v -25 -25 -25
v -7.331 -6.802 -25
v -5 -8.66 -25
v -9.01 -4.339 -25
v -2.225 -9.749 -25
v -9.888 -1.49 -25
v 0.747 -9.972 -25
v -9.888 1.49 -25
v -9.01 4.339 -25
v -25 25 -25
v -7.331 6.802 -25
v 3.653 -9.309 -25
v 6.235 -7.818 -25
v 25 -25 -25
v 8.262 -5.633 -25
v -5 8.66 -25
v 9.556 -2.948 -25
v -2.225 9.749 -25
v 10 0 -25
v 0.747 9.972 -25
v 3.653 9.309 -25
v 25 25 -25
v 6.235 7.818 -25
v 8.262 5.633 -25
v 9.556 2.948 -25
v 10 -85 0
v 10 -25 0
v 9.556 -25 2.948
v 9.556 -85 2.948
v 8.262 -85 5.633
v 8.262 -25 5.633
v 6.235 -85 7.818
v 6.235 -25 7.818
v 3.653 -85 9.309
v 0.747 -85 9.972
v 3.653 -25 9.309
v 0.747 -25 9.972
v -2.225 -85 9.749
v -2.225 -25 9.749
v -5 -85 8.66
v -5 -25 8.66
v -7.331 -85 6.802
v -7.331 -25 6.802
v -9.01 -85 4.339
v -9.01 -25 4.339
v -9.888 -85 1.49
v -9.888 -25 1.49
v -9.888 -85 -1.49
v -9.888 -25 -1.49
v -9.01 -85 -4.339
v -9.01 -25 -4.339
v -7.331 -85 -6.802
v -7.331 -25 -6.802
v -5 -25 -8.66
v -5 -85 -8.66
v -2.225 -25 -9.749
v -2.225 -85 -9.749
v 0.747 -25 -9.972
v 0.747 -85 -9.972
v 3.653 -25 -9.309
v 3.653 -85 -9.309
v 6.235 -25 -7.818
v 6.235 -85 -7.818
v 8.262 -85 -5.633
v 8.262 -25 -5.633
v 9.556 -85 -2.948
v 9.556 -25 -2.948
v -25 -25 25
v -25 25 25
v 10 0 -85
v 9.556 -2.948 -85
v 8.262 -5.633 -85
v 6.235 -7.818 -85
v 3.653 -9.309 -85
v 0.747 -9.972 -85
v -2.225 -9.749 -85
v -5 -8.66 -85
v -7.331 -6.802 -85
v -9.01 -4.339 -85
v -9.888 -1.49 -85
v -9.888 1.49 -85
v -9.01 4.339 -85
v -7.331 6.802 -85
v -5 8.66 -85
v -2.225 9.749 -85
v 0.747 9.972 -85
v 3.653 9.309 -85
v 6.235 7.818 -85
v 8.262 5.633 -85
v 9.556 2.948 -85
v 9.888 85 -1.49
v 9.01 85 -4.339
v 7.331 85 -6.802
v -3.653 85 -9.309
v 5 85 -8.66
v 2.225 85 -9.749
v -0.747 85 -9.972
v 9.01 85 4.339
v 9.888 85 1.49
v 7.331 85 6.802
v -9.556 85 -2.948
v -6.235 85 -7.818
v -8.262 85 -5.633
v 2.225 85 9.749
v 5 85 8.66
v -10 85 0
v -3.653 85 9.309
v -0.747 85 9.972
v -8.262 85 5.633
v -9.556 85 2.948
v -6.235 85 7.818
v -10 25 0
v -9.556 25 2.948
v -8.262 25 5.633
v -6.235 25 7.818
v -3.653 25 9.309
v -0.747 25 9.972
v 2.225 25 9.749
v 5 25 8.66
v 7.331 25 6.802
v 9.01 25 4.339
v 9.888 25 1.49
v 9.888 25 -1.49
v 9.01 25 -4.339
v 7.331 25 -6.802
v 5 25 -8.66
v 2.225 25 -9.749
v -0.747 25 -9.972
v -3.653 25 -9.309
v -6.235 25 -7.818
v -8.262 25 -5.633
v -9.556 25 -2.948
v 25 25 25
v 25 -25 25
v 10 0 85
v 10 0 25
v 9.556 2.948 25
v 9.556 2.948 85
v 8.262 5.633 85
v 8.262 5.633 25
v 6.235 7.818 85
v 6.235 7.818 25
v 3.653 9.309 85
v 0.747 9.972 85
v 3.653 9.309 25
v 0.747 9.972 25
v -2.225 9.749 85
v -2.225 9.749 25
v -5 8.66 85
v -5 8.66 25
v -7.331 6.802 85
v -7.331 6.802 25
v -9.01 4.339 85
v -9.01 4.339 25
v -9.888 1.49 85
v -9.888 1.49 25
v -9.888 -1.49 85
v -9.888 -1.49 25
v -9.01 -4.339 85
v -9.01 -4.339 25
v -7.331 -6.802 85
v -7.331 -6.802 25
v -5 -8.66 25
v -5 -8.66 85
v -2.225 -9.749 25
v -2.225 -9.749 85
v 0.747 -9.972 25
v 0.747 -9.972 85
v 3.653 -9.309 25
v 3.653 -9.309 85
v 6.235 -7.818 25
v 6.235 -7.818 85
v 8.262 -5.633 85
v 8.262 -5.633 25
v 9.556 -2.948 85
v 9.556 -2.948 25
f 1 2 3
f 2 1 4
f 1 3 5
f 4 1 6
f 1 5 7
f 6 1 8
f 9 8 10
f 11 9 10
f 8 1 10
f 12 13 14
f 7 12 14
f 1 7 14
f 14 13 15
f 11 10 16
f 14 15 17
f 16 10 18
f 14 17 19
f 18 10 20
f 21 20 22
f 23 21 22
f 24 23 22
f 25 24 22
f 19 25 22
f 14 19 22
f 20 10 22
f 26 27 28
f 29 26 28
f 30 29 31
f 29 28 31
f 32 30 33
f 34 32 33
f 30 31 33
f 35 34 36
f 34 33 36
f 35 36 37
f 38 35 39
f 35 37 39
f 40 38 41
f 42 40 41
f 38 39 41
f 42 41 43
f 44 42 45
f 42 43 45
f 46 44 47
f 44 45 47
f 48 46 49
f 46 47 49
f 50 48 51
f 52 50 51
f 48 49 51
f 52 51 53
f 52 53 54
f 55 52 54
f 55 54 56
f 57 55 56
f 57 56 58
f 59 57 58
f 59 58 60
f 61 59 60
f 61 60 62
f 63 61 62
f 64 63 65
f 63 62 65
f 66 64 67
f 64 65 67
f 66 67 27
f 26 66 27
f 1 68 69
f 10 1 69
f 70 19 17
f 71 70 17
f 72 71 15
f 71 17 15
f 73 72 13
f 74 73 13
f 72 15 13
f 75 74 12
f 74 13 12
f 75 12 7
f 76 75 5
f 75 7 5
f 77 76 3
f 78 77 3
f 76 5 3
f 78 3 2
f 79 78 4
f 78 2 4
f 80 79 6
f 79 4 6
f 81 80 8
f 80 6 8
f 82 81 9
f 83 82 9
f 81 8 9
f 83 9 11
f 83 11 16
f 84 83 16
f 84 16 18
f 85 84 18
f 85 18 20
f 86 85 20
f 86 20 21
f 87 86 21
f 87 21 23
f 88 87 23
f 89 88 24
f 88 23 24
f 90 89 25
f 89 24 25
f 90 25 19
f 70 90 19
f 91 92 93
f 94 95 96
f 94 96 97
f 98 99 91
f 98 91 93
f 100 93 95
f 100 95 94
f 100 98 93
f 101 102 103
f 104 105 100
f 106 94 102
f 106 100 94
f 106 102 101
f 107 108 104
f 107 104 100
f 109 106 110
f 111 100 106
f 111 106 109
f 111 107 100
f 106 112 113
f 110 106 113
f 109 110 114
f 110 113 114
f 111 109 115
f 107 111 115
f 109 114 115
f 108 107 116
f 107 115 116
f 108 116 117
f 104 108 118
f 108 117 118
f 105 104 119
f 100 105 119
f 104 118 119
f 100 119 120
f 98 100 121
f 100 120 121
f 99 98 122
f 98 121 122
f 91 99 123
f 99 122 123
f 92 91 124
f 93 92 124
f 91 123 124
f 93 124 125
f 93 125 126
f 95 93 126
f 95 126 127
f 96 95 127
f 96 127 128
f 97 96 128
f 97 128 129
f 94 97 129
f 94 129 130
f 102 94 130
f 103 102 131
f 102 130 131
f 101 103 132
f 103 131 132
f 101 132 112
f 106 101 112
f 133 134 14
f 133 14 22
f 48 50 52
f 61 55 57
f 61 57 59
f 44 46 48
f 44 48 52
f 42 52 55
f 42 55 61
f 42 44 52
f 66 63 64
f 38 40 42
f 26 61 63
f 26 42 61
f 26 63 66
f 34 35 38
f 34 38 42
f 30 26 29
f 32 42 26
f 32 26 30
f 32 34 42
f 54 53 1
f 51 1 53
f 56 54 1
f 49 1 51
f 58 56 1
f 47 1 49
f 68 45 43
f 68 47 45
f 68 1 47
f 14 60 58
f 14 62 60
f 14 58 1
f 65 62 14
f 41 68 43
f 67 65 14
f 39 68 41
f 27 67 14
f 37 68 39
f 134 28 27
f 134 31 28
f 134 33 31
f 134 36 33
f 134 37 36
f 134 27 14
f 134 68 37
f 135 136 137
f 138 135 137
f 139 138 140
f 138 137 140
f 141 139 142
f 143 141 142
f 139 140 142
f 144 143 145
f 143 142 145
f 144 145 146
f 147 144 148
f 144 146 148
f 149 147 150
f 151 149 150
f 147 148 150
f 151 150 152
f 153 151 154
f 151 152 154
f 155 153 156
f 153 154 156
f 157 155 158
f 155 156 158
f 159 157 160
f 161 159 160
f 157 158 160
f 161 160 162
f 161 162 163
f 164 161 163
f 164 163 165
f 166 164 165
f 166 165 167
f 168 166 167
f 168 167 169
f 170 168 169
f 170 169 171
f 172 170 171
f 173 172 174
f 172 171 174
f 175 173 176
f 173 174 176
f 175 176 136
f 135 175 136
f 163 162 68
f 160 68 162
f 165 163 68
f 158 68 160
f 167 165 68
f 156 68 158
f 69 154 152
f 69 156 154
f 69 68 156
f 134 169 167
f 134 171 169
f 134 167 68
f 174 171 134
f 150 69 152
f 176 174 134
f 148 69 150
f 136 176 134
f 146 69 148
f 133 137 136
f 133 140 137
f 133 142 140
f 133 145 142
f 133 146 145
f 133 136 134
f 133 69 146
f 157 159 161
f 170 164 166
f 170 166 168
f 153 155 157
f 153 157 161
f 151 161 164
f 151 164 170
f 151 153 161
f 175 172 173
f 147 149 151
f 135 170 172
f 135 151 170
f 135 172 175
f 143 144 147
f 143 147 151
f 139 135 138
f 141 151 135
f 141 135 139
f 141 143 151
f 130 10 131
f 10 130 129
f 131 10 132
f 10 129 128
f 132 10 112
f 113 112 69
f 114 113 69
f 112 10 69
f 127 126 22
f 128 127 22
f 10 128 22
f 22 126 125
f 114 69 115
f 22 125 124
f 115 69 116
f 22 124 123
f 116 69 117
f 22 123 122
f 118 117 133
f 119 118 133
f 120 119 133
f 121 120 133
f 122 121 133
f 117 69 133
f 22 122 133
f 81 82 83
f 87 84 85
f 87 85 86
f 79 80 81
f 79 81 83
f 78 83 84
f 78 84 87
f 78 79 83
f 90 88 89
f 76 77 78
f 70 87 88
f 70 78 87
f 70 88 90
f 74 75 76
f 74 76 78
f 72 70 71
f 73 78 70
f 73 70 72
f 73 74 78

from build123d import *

# Parameters (mm, degrees)
F0_W          = 50
F0_H          = 50
F1_DEPTH      = 25
F1_DEPTH_BACK = 25
F2_R          = 10
F3_DEPTH      = 60
F4_R          = 10
F5_DEPTH      = 60
F6_R          = 10
F7_DEPTH      = 60
F8_R          = 10
F9_DEPTH      = 60


with BuildPart() as f1:
    # F0 (on Top) → F1 (new body, two sides)
    with BuildSketch(Plane.XY) as f1_sk:
        Rectangle(F0_W, F0_H)
    extrude(amount=F1_DEPTH)
    extrude(f1_sk.sketch, amount=-F1_DEPTH_BACK)

    # F2 (on face) → F3 (join)
    with BuildSketch(Plane.XZ.offset(25)):
        Circle(F2_R)
    extrude(amount=F3_DEPTH)

    # F4 (on face) → F5 (join)
    with BuildSketch(Plane(origin=(0, 0, -25), x_dir=(1, 0, 0), z_dir=(0, 0, -1))):
        Circle(F4_R)
    extrude(amount=F5_DEPTH)

    # F6 (on face) → F7 (join)
    with BuildSketch(Plane.XY.offset(25)):
        Circle(F6_R)
    extrude(amount=F7_DEPTH)

    # F8 (on face) → F9 (join)
    with BuildSketch(Plane(origin=(0, 25, 0), x_dir=(-1, 0, 0), z_dir=(0, 1, 0))):
        Circle(F8_R)
    extrude(amount=F9_DEPTH)


solid = f1.part
